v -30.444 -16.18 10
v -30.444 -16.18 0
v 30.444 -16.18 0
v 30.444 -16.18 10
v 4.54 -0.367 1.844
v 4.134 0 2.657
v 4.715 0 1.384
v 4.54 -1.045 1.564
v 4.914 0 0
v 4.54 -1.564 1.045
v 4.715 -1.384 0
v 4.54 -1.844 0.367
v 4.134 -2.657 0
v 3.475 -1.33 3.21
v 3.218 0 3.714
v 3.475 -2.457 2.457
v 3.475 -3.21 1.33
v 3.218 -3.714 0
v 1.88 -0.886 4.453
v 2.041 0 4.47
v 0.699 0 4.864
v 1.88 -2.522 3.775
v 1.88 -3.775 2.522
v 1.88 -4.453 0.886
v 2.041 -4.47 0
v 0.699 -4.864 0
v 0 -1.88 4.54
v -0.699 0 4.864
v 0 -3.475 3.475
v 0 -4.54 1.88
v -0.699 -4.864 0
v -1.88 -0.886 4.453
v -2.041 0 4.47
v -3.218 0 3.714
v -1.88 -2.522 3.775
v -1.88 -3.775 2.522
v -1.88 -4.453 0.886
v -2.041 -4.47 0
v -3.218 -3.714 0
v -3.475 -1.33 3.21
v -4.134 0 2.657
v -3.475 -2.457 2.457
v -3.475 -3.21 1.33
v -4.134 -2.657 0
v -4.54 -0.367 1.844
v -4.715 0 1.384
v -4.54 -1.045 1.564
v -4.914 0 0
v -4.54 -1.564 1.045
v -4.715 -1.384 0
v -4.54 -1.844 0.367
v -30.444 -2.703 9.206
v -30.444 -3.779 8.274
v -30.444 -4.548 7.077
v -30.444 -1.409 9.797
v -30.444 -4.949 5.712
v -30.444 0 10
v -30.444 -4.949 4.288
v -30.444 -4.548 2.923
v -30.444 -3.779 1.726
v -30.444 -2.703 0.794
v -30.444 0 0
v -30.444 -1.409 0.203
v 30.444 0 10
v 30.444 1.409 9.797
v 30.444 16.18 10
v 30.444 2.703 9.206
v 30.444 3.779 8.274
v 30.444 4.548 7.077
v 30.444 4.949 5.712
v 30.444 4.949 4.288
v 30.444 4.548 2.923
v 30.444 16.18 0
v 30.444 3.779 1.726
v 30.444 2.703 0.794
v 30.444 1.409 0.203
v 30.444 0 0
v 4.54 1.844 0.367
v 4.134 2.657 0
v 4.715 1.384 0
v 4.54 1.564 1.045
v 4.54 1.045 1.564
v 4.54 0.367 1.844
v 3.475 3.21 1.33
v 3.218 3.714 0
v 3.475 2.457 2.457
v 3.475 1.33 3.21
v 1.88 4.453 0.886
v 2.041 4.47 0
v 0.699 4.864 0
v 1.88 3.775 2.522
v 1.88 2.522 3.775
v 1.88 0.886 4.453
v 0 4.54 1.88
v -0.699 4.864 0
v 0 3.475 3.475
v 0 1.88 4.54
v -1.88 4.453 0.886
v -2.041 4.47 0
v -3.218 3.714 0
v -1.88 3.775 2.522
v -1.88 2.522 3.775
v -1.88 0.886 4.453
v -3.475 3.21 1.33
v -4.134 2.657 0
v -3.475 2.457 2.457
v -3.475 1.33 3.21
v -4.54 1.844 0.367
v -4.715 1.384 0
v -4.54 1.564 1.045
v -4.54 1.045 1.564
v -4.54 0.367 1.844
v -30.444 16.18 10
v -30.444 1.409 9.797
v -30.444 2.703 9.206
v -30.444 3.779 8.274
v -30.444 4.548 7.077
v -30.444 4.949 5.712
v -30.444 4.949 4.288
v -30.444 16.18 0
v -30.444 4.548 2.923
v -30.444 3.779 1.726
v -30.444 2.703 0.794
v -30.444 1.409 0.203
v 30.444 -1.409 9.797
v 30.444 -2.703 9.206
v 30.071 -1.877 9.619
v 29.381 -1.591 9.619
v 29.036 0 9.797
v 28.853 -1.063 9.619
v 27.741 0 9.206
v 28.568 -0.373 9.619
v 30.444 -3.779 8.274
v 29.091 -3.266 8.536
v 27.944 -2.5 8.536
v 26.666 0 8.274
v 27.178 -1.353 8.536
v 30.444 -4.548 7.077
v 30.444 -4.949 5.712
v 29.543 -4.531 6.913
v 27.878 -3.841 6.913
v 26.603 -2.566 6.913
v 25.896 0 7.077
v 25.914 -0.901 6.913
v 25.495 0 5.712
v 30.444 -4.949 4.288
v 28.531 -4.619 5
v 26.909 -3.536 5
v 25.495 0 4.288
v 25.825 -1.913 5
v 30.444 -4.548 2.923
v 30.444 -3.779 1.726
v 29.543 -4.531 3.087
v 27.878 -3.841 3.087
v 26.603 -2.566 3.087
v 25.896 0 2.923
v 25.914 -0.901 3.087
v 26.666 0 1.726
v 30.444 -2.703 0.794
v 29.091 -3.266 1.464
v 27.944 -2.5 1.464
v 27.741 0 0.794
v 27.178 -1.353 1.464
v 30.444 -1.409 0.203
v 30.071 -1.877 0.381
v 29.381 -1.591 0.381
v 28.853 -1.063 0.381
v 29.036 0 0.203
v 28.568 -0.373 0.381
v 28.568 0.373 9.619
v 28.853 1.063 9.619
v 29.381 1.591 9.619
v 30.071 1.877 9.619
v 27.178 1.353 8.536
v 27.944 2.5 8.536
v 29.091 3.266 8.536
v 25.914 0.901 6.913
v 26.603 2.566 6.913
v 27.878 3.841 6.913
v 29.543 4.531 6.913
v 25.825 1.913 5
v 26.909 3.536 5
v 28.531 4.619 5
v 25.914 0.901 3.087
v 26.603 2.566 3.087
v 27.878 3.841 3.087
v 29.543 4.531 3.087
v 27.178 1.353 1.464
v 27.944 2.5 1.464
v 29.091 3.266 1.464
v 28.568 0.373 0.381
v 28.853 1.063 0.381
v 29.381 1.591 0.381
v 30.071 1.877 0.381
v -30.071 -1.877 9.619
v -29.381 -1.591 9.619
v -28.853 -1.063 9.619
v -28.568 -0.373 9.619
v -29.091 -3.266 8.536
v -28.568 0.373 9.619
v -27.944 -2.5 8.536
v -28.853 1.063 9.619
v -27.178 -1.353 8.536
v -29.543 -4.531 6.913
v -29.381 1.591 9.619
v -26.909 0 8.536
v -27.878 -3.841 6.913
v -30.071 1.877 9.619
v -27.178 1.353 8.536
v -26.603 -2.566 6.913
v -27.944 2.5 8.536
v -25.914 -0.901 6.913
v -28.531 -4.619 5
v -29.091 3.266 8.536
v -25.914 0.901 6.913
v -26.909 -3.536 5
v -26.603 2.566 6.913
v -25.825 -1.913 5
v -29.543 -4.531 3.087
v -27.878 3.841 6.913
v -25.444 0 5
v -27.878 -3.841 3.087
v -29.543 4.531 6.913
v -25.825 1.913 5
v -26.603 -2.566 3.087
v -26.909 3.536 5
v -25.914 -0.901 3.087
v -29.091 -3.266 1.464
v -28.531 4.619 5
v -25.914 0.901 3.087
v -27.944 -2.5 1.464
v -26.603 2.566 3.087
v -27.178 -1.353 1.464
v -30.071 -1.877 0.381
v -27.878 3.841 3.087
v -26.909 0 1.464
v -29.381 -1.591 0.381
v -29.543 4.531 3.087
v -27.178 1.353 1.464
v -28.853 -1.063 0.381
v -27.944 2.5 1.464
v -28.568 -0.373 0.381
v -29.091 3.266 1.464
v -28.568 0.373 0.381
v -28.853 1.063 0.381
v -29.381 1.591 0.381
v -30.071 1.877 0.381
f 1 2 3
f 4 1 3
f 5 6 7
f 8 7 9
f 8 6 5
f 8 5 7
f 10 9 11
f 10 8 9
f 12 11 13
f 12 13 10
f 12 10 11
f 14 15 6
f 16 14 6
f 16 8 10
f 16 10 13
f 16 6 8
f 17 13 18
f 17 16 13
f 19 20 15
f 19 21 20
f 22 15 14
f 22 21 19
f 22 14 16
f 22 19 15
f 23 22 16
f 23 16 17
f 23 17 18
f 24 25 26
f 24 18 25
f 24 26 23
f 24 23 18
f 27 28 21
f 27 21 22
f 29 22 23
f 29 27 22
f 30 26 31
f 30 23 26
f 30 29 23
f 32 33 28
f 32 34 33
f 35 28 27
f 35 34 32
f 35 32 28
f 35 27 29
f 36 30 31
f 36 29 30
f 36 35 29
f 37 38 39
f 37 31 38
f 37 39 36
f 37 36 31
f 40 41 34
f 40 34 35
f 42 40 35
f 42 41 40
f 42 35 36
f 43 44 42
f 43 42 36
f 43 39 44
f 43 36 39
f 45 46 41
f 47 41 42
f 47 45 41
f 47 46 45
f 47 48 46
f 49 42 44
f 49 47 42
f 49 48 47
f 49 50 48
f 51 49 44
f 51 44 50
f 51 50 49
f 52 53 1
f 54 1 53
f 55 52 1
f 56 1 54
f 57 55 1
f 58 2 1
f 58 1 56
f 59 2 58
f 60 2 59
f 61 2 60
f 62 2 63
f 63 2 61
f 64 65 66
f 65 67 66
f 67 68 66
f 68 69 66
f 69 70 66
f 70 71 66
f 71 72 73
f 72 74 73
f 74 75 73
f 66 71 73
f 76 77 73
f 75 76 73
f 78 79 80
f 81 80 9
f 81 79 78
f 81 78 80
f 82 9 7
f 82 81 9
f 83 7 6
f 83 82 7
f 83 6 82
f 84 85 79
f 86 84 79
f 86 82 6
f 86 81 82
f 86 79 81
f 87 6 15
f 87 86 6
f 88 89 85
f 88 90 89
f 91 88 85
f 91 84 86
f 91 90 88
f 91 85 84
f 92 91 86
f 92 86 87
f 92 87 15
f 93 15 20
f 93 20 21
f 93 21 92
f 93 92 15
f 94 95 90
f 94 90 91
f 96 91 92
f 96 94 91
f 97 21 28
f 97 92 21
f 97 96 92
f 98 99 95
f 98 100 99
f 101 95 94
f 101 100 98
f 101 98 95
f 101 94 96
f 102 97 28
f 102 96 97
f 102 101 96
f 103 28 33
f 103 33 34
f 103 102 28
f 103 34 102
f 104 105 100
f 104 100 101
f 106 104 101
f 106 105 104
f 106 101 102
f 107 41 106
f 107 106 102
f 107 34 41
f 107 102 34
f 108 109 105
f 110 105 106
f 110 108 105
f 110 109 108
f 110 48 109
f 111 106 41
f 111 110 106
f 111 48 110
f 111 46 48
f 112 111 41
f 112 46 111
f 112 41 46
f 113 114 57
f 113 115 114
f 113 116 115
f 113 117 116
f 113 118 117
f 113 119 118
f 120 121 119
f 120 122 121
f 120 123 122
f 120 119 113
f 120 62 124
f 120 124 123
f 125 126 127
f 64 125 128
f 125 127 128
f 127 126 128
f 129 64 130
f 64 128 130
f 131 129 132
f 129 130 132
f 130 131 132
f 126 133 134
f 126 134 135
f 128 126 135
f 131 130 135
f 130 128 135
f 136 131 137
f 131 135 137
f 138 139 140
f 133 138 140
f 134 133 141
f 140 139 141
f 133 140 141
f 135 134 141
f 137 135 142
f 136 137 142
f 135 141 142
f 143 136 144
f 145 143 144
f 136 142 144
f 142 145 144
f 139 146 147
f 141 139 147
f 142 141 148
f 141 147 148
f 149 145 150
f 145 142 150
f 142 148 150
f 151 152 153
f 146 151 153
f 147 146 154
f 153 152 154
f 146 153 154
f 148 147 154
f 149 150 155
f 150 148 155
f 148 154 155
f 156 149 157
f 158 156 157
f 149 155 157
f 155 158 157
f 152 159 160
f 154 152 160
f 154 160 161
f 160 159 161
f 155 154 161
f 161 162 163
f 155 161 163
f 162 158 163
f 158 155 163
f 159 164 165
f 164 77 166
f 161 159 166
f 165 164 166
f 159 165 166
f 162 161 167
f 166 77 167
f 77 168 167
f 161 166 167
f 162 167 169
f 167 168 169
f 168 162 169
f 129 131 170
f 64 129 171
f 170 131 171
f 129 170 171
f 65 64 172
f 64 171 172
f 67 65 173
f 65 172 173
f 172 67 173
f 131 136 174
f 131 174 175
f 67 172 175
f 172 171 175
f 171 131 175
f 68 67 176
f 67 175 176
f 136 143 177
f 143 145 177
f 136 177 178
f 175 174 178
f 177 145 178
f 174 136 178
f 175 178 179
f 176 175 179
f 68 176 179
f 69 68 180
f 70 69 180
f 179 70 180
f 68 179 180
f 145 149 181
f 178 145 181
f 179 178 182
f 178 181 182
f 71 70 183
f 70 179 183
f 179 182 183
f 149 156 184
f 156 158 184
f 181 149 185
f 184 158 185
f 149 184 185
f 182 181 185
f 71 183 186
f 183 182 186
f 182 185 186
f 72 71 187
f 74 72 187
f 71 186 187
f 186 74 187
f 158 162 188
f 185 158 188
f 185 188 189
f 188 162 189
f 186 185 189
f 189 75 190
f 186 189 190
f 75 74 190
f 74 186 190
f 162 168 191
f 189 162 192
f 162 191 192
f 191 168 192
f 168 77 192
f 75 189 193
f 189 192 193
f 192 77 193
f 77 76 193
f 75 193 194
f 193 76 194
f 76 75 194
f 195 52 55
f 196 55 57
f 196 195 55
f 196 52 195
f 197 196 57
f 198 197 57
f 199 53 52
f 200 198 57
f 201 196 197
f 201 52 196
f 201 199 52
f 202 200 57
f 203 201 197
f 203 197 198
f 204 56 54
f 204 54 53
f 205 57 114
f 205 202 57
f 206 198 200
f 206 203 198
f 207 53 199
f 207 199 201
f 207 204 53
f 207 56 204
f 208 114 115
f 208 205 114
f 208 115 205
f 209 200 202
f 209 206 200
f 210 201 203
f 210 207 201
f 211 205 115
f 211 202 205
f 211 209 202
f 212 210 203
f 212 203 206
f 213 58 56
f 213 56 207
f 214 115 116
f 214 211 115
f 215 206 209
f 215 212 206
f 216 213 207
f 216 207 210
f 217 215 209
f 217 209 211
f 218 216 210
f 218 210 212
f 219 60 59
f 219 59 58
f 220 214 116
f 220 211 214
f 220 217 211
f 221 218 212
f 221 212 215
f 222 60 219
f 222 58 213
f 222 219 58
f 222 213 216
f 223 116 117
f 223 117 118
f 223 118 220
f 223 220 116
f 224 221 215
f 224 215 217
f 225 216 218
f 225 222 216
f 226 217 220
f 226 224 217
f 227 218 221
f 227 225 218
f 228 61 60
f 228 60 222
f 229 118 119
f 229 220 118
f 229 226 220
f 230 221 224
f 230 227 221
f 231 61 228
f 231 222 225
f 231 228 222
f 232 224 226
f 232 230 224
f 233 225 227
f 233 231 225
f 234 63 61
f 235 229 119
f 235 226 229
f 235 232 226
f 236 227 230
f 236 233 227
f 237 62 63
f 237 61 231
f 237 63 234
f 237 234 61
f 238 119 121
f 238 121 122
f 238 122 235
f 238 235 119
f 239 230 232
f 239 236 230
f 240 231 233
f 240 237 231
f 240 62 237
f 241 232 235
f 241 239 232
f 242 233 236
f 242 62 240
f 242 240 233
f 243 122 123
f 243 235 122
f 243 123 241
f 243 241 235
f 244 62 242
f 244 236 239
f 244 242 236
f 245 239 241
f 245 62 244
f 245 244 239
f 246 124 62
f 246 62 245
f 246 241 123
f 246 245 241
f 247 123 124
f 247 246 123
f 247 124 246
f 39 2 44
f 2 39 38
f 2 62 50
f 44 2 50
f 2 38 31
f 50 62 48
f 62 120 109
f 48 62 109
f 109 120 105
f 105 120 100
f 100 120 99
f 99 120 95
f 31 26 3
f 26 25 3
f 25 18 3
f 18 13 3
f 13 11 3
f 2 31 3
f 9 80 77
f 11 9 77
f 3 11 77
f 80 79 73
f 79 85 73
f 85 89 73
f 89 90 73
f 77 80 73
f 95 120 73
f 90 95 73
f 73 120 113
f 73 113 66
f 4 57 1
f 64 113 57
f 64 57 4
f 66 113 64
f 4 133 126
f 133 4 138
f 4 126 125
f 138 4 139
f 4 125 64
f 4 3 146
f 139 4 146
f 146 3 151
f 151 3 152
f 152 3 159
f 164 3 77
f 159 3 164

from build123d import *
from build123d.topology import SkipClean

# Parameters (mm, degrees)
SKETCH_2_W      = 60.888503838
SKETCH_2_H      = 32.359912294
EXTRUDE_1_DEPTH = 10


with BuildPart() as part:
    # 草图2 → 凸台-拉伸1 (new body)
    with BuildSketch(Plane.XY):
        Rectangle(SKETCH_2_W, SKETCH_2_H)
    extrude(amount=EXTRUDE_1_DEPTH)

    # 草图5 → 切除-旋转5 (revolve, cut)
    with BuildSketch(Plane(origin=(0, 0, 0), x_dir=(1, 0, 0), z_dir=(0, 1, 0))):
        with BuildLine():
            Line((-30.444251919, 0), (-30.444251919, -10))
            ThreePointArc((-30.444251919, -10), (-25.444251919, -5), (-30.444251919, 0))
        make_face()
    cut_revolve_5 = revolve(axis=Axis((-30.444251919, 0, 0), (0, 0, 1)), mode=Mode.SUBTRACT)

    # 镜向1: 切除-旋转5 across plane
    with SkipClean():  # the faces are left unmerged after this step: merging them gives an invalid solid
        add(cut_revolve_5.mirror(Plane(origin=(0, 0, 0), x_dir=(0, 0, 1), z_dir=(1, 0, 0))), mode=Mode.SUBTRACT)

    # 草图6 → 切除-旋转6 (revolve, cut)
    with SkipClean():  # the faces are left unmerged after this step: merging them gives an invalid solid
        with BuildSketch(Plane(origin=(0, 0, 0), x_dir=(1, 0, 0), z_dir=(0, 1, 0))):
            with BuildLine():
                Line((-4.913926023, 0), (4.913926023, 0))
                ThreePointArc((4.913926023, 0), (0, -4.913926023), (-4.913926023, 0))
            make_face()
        revolve(axis=Axis((-4.913926023, 0, 0), (1, 0, 0)), mode=Mode.SUBTRACT)


solid = part.part
